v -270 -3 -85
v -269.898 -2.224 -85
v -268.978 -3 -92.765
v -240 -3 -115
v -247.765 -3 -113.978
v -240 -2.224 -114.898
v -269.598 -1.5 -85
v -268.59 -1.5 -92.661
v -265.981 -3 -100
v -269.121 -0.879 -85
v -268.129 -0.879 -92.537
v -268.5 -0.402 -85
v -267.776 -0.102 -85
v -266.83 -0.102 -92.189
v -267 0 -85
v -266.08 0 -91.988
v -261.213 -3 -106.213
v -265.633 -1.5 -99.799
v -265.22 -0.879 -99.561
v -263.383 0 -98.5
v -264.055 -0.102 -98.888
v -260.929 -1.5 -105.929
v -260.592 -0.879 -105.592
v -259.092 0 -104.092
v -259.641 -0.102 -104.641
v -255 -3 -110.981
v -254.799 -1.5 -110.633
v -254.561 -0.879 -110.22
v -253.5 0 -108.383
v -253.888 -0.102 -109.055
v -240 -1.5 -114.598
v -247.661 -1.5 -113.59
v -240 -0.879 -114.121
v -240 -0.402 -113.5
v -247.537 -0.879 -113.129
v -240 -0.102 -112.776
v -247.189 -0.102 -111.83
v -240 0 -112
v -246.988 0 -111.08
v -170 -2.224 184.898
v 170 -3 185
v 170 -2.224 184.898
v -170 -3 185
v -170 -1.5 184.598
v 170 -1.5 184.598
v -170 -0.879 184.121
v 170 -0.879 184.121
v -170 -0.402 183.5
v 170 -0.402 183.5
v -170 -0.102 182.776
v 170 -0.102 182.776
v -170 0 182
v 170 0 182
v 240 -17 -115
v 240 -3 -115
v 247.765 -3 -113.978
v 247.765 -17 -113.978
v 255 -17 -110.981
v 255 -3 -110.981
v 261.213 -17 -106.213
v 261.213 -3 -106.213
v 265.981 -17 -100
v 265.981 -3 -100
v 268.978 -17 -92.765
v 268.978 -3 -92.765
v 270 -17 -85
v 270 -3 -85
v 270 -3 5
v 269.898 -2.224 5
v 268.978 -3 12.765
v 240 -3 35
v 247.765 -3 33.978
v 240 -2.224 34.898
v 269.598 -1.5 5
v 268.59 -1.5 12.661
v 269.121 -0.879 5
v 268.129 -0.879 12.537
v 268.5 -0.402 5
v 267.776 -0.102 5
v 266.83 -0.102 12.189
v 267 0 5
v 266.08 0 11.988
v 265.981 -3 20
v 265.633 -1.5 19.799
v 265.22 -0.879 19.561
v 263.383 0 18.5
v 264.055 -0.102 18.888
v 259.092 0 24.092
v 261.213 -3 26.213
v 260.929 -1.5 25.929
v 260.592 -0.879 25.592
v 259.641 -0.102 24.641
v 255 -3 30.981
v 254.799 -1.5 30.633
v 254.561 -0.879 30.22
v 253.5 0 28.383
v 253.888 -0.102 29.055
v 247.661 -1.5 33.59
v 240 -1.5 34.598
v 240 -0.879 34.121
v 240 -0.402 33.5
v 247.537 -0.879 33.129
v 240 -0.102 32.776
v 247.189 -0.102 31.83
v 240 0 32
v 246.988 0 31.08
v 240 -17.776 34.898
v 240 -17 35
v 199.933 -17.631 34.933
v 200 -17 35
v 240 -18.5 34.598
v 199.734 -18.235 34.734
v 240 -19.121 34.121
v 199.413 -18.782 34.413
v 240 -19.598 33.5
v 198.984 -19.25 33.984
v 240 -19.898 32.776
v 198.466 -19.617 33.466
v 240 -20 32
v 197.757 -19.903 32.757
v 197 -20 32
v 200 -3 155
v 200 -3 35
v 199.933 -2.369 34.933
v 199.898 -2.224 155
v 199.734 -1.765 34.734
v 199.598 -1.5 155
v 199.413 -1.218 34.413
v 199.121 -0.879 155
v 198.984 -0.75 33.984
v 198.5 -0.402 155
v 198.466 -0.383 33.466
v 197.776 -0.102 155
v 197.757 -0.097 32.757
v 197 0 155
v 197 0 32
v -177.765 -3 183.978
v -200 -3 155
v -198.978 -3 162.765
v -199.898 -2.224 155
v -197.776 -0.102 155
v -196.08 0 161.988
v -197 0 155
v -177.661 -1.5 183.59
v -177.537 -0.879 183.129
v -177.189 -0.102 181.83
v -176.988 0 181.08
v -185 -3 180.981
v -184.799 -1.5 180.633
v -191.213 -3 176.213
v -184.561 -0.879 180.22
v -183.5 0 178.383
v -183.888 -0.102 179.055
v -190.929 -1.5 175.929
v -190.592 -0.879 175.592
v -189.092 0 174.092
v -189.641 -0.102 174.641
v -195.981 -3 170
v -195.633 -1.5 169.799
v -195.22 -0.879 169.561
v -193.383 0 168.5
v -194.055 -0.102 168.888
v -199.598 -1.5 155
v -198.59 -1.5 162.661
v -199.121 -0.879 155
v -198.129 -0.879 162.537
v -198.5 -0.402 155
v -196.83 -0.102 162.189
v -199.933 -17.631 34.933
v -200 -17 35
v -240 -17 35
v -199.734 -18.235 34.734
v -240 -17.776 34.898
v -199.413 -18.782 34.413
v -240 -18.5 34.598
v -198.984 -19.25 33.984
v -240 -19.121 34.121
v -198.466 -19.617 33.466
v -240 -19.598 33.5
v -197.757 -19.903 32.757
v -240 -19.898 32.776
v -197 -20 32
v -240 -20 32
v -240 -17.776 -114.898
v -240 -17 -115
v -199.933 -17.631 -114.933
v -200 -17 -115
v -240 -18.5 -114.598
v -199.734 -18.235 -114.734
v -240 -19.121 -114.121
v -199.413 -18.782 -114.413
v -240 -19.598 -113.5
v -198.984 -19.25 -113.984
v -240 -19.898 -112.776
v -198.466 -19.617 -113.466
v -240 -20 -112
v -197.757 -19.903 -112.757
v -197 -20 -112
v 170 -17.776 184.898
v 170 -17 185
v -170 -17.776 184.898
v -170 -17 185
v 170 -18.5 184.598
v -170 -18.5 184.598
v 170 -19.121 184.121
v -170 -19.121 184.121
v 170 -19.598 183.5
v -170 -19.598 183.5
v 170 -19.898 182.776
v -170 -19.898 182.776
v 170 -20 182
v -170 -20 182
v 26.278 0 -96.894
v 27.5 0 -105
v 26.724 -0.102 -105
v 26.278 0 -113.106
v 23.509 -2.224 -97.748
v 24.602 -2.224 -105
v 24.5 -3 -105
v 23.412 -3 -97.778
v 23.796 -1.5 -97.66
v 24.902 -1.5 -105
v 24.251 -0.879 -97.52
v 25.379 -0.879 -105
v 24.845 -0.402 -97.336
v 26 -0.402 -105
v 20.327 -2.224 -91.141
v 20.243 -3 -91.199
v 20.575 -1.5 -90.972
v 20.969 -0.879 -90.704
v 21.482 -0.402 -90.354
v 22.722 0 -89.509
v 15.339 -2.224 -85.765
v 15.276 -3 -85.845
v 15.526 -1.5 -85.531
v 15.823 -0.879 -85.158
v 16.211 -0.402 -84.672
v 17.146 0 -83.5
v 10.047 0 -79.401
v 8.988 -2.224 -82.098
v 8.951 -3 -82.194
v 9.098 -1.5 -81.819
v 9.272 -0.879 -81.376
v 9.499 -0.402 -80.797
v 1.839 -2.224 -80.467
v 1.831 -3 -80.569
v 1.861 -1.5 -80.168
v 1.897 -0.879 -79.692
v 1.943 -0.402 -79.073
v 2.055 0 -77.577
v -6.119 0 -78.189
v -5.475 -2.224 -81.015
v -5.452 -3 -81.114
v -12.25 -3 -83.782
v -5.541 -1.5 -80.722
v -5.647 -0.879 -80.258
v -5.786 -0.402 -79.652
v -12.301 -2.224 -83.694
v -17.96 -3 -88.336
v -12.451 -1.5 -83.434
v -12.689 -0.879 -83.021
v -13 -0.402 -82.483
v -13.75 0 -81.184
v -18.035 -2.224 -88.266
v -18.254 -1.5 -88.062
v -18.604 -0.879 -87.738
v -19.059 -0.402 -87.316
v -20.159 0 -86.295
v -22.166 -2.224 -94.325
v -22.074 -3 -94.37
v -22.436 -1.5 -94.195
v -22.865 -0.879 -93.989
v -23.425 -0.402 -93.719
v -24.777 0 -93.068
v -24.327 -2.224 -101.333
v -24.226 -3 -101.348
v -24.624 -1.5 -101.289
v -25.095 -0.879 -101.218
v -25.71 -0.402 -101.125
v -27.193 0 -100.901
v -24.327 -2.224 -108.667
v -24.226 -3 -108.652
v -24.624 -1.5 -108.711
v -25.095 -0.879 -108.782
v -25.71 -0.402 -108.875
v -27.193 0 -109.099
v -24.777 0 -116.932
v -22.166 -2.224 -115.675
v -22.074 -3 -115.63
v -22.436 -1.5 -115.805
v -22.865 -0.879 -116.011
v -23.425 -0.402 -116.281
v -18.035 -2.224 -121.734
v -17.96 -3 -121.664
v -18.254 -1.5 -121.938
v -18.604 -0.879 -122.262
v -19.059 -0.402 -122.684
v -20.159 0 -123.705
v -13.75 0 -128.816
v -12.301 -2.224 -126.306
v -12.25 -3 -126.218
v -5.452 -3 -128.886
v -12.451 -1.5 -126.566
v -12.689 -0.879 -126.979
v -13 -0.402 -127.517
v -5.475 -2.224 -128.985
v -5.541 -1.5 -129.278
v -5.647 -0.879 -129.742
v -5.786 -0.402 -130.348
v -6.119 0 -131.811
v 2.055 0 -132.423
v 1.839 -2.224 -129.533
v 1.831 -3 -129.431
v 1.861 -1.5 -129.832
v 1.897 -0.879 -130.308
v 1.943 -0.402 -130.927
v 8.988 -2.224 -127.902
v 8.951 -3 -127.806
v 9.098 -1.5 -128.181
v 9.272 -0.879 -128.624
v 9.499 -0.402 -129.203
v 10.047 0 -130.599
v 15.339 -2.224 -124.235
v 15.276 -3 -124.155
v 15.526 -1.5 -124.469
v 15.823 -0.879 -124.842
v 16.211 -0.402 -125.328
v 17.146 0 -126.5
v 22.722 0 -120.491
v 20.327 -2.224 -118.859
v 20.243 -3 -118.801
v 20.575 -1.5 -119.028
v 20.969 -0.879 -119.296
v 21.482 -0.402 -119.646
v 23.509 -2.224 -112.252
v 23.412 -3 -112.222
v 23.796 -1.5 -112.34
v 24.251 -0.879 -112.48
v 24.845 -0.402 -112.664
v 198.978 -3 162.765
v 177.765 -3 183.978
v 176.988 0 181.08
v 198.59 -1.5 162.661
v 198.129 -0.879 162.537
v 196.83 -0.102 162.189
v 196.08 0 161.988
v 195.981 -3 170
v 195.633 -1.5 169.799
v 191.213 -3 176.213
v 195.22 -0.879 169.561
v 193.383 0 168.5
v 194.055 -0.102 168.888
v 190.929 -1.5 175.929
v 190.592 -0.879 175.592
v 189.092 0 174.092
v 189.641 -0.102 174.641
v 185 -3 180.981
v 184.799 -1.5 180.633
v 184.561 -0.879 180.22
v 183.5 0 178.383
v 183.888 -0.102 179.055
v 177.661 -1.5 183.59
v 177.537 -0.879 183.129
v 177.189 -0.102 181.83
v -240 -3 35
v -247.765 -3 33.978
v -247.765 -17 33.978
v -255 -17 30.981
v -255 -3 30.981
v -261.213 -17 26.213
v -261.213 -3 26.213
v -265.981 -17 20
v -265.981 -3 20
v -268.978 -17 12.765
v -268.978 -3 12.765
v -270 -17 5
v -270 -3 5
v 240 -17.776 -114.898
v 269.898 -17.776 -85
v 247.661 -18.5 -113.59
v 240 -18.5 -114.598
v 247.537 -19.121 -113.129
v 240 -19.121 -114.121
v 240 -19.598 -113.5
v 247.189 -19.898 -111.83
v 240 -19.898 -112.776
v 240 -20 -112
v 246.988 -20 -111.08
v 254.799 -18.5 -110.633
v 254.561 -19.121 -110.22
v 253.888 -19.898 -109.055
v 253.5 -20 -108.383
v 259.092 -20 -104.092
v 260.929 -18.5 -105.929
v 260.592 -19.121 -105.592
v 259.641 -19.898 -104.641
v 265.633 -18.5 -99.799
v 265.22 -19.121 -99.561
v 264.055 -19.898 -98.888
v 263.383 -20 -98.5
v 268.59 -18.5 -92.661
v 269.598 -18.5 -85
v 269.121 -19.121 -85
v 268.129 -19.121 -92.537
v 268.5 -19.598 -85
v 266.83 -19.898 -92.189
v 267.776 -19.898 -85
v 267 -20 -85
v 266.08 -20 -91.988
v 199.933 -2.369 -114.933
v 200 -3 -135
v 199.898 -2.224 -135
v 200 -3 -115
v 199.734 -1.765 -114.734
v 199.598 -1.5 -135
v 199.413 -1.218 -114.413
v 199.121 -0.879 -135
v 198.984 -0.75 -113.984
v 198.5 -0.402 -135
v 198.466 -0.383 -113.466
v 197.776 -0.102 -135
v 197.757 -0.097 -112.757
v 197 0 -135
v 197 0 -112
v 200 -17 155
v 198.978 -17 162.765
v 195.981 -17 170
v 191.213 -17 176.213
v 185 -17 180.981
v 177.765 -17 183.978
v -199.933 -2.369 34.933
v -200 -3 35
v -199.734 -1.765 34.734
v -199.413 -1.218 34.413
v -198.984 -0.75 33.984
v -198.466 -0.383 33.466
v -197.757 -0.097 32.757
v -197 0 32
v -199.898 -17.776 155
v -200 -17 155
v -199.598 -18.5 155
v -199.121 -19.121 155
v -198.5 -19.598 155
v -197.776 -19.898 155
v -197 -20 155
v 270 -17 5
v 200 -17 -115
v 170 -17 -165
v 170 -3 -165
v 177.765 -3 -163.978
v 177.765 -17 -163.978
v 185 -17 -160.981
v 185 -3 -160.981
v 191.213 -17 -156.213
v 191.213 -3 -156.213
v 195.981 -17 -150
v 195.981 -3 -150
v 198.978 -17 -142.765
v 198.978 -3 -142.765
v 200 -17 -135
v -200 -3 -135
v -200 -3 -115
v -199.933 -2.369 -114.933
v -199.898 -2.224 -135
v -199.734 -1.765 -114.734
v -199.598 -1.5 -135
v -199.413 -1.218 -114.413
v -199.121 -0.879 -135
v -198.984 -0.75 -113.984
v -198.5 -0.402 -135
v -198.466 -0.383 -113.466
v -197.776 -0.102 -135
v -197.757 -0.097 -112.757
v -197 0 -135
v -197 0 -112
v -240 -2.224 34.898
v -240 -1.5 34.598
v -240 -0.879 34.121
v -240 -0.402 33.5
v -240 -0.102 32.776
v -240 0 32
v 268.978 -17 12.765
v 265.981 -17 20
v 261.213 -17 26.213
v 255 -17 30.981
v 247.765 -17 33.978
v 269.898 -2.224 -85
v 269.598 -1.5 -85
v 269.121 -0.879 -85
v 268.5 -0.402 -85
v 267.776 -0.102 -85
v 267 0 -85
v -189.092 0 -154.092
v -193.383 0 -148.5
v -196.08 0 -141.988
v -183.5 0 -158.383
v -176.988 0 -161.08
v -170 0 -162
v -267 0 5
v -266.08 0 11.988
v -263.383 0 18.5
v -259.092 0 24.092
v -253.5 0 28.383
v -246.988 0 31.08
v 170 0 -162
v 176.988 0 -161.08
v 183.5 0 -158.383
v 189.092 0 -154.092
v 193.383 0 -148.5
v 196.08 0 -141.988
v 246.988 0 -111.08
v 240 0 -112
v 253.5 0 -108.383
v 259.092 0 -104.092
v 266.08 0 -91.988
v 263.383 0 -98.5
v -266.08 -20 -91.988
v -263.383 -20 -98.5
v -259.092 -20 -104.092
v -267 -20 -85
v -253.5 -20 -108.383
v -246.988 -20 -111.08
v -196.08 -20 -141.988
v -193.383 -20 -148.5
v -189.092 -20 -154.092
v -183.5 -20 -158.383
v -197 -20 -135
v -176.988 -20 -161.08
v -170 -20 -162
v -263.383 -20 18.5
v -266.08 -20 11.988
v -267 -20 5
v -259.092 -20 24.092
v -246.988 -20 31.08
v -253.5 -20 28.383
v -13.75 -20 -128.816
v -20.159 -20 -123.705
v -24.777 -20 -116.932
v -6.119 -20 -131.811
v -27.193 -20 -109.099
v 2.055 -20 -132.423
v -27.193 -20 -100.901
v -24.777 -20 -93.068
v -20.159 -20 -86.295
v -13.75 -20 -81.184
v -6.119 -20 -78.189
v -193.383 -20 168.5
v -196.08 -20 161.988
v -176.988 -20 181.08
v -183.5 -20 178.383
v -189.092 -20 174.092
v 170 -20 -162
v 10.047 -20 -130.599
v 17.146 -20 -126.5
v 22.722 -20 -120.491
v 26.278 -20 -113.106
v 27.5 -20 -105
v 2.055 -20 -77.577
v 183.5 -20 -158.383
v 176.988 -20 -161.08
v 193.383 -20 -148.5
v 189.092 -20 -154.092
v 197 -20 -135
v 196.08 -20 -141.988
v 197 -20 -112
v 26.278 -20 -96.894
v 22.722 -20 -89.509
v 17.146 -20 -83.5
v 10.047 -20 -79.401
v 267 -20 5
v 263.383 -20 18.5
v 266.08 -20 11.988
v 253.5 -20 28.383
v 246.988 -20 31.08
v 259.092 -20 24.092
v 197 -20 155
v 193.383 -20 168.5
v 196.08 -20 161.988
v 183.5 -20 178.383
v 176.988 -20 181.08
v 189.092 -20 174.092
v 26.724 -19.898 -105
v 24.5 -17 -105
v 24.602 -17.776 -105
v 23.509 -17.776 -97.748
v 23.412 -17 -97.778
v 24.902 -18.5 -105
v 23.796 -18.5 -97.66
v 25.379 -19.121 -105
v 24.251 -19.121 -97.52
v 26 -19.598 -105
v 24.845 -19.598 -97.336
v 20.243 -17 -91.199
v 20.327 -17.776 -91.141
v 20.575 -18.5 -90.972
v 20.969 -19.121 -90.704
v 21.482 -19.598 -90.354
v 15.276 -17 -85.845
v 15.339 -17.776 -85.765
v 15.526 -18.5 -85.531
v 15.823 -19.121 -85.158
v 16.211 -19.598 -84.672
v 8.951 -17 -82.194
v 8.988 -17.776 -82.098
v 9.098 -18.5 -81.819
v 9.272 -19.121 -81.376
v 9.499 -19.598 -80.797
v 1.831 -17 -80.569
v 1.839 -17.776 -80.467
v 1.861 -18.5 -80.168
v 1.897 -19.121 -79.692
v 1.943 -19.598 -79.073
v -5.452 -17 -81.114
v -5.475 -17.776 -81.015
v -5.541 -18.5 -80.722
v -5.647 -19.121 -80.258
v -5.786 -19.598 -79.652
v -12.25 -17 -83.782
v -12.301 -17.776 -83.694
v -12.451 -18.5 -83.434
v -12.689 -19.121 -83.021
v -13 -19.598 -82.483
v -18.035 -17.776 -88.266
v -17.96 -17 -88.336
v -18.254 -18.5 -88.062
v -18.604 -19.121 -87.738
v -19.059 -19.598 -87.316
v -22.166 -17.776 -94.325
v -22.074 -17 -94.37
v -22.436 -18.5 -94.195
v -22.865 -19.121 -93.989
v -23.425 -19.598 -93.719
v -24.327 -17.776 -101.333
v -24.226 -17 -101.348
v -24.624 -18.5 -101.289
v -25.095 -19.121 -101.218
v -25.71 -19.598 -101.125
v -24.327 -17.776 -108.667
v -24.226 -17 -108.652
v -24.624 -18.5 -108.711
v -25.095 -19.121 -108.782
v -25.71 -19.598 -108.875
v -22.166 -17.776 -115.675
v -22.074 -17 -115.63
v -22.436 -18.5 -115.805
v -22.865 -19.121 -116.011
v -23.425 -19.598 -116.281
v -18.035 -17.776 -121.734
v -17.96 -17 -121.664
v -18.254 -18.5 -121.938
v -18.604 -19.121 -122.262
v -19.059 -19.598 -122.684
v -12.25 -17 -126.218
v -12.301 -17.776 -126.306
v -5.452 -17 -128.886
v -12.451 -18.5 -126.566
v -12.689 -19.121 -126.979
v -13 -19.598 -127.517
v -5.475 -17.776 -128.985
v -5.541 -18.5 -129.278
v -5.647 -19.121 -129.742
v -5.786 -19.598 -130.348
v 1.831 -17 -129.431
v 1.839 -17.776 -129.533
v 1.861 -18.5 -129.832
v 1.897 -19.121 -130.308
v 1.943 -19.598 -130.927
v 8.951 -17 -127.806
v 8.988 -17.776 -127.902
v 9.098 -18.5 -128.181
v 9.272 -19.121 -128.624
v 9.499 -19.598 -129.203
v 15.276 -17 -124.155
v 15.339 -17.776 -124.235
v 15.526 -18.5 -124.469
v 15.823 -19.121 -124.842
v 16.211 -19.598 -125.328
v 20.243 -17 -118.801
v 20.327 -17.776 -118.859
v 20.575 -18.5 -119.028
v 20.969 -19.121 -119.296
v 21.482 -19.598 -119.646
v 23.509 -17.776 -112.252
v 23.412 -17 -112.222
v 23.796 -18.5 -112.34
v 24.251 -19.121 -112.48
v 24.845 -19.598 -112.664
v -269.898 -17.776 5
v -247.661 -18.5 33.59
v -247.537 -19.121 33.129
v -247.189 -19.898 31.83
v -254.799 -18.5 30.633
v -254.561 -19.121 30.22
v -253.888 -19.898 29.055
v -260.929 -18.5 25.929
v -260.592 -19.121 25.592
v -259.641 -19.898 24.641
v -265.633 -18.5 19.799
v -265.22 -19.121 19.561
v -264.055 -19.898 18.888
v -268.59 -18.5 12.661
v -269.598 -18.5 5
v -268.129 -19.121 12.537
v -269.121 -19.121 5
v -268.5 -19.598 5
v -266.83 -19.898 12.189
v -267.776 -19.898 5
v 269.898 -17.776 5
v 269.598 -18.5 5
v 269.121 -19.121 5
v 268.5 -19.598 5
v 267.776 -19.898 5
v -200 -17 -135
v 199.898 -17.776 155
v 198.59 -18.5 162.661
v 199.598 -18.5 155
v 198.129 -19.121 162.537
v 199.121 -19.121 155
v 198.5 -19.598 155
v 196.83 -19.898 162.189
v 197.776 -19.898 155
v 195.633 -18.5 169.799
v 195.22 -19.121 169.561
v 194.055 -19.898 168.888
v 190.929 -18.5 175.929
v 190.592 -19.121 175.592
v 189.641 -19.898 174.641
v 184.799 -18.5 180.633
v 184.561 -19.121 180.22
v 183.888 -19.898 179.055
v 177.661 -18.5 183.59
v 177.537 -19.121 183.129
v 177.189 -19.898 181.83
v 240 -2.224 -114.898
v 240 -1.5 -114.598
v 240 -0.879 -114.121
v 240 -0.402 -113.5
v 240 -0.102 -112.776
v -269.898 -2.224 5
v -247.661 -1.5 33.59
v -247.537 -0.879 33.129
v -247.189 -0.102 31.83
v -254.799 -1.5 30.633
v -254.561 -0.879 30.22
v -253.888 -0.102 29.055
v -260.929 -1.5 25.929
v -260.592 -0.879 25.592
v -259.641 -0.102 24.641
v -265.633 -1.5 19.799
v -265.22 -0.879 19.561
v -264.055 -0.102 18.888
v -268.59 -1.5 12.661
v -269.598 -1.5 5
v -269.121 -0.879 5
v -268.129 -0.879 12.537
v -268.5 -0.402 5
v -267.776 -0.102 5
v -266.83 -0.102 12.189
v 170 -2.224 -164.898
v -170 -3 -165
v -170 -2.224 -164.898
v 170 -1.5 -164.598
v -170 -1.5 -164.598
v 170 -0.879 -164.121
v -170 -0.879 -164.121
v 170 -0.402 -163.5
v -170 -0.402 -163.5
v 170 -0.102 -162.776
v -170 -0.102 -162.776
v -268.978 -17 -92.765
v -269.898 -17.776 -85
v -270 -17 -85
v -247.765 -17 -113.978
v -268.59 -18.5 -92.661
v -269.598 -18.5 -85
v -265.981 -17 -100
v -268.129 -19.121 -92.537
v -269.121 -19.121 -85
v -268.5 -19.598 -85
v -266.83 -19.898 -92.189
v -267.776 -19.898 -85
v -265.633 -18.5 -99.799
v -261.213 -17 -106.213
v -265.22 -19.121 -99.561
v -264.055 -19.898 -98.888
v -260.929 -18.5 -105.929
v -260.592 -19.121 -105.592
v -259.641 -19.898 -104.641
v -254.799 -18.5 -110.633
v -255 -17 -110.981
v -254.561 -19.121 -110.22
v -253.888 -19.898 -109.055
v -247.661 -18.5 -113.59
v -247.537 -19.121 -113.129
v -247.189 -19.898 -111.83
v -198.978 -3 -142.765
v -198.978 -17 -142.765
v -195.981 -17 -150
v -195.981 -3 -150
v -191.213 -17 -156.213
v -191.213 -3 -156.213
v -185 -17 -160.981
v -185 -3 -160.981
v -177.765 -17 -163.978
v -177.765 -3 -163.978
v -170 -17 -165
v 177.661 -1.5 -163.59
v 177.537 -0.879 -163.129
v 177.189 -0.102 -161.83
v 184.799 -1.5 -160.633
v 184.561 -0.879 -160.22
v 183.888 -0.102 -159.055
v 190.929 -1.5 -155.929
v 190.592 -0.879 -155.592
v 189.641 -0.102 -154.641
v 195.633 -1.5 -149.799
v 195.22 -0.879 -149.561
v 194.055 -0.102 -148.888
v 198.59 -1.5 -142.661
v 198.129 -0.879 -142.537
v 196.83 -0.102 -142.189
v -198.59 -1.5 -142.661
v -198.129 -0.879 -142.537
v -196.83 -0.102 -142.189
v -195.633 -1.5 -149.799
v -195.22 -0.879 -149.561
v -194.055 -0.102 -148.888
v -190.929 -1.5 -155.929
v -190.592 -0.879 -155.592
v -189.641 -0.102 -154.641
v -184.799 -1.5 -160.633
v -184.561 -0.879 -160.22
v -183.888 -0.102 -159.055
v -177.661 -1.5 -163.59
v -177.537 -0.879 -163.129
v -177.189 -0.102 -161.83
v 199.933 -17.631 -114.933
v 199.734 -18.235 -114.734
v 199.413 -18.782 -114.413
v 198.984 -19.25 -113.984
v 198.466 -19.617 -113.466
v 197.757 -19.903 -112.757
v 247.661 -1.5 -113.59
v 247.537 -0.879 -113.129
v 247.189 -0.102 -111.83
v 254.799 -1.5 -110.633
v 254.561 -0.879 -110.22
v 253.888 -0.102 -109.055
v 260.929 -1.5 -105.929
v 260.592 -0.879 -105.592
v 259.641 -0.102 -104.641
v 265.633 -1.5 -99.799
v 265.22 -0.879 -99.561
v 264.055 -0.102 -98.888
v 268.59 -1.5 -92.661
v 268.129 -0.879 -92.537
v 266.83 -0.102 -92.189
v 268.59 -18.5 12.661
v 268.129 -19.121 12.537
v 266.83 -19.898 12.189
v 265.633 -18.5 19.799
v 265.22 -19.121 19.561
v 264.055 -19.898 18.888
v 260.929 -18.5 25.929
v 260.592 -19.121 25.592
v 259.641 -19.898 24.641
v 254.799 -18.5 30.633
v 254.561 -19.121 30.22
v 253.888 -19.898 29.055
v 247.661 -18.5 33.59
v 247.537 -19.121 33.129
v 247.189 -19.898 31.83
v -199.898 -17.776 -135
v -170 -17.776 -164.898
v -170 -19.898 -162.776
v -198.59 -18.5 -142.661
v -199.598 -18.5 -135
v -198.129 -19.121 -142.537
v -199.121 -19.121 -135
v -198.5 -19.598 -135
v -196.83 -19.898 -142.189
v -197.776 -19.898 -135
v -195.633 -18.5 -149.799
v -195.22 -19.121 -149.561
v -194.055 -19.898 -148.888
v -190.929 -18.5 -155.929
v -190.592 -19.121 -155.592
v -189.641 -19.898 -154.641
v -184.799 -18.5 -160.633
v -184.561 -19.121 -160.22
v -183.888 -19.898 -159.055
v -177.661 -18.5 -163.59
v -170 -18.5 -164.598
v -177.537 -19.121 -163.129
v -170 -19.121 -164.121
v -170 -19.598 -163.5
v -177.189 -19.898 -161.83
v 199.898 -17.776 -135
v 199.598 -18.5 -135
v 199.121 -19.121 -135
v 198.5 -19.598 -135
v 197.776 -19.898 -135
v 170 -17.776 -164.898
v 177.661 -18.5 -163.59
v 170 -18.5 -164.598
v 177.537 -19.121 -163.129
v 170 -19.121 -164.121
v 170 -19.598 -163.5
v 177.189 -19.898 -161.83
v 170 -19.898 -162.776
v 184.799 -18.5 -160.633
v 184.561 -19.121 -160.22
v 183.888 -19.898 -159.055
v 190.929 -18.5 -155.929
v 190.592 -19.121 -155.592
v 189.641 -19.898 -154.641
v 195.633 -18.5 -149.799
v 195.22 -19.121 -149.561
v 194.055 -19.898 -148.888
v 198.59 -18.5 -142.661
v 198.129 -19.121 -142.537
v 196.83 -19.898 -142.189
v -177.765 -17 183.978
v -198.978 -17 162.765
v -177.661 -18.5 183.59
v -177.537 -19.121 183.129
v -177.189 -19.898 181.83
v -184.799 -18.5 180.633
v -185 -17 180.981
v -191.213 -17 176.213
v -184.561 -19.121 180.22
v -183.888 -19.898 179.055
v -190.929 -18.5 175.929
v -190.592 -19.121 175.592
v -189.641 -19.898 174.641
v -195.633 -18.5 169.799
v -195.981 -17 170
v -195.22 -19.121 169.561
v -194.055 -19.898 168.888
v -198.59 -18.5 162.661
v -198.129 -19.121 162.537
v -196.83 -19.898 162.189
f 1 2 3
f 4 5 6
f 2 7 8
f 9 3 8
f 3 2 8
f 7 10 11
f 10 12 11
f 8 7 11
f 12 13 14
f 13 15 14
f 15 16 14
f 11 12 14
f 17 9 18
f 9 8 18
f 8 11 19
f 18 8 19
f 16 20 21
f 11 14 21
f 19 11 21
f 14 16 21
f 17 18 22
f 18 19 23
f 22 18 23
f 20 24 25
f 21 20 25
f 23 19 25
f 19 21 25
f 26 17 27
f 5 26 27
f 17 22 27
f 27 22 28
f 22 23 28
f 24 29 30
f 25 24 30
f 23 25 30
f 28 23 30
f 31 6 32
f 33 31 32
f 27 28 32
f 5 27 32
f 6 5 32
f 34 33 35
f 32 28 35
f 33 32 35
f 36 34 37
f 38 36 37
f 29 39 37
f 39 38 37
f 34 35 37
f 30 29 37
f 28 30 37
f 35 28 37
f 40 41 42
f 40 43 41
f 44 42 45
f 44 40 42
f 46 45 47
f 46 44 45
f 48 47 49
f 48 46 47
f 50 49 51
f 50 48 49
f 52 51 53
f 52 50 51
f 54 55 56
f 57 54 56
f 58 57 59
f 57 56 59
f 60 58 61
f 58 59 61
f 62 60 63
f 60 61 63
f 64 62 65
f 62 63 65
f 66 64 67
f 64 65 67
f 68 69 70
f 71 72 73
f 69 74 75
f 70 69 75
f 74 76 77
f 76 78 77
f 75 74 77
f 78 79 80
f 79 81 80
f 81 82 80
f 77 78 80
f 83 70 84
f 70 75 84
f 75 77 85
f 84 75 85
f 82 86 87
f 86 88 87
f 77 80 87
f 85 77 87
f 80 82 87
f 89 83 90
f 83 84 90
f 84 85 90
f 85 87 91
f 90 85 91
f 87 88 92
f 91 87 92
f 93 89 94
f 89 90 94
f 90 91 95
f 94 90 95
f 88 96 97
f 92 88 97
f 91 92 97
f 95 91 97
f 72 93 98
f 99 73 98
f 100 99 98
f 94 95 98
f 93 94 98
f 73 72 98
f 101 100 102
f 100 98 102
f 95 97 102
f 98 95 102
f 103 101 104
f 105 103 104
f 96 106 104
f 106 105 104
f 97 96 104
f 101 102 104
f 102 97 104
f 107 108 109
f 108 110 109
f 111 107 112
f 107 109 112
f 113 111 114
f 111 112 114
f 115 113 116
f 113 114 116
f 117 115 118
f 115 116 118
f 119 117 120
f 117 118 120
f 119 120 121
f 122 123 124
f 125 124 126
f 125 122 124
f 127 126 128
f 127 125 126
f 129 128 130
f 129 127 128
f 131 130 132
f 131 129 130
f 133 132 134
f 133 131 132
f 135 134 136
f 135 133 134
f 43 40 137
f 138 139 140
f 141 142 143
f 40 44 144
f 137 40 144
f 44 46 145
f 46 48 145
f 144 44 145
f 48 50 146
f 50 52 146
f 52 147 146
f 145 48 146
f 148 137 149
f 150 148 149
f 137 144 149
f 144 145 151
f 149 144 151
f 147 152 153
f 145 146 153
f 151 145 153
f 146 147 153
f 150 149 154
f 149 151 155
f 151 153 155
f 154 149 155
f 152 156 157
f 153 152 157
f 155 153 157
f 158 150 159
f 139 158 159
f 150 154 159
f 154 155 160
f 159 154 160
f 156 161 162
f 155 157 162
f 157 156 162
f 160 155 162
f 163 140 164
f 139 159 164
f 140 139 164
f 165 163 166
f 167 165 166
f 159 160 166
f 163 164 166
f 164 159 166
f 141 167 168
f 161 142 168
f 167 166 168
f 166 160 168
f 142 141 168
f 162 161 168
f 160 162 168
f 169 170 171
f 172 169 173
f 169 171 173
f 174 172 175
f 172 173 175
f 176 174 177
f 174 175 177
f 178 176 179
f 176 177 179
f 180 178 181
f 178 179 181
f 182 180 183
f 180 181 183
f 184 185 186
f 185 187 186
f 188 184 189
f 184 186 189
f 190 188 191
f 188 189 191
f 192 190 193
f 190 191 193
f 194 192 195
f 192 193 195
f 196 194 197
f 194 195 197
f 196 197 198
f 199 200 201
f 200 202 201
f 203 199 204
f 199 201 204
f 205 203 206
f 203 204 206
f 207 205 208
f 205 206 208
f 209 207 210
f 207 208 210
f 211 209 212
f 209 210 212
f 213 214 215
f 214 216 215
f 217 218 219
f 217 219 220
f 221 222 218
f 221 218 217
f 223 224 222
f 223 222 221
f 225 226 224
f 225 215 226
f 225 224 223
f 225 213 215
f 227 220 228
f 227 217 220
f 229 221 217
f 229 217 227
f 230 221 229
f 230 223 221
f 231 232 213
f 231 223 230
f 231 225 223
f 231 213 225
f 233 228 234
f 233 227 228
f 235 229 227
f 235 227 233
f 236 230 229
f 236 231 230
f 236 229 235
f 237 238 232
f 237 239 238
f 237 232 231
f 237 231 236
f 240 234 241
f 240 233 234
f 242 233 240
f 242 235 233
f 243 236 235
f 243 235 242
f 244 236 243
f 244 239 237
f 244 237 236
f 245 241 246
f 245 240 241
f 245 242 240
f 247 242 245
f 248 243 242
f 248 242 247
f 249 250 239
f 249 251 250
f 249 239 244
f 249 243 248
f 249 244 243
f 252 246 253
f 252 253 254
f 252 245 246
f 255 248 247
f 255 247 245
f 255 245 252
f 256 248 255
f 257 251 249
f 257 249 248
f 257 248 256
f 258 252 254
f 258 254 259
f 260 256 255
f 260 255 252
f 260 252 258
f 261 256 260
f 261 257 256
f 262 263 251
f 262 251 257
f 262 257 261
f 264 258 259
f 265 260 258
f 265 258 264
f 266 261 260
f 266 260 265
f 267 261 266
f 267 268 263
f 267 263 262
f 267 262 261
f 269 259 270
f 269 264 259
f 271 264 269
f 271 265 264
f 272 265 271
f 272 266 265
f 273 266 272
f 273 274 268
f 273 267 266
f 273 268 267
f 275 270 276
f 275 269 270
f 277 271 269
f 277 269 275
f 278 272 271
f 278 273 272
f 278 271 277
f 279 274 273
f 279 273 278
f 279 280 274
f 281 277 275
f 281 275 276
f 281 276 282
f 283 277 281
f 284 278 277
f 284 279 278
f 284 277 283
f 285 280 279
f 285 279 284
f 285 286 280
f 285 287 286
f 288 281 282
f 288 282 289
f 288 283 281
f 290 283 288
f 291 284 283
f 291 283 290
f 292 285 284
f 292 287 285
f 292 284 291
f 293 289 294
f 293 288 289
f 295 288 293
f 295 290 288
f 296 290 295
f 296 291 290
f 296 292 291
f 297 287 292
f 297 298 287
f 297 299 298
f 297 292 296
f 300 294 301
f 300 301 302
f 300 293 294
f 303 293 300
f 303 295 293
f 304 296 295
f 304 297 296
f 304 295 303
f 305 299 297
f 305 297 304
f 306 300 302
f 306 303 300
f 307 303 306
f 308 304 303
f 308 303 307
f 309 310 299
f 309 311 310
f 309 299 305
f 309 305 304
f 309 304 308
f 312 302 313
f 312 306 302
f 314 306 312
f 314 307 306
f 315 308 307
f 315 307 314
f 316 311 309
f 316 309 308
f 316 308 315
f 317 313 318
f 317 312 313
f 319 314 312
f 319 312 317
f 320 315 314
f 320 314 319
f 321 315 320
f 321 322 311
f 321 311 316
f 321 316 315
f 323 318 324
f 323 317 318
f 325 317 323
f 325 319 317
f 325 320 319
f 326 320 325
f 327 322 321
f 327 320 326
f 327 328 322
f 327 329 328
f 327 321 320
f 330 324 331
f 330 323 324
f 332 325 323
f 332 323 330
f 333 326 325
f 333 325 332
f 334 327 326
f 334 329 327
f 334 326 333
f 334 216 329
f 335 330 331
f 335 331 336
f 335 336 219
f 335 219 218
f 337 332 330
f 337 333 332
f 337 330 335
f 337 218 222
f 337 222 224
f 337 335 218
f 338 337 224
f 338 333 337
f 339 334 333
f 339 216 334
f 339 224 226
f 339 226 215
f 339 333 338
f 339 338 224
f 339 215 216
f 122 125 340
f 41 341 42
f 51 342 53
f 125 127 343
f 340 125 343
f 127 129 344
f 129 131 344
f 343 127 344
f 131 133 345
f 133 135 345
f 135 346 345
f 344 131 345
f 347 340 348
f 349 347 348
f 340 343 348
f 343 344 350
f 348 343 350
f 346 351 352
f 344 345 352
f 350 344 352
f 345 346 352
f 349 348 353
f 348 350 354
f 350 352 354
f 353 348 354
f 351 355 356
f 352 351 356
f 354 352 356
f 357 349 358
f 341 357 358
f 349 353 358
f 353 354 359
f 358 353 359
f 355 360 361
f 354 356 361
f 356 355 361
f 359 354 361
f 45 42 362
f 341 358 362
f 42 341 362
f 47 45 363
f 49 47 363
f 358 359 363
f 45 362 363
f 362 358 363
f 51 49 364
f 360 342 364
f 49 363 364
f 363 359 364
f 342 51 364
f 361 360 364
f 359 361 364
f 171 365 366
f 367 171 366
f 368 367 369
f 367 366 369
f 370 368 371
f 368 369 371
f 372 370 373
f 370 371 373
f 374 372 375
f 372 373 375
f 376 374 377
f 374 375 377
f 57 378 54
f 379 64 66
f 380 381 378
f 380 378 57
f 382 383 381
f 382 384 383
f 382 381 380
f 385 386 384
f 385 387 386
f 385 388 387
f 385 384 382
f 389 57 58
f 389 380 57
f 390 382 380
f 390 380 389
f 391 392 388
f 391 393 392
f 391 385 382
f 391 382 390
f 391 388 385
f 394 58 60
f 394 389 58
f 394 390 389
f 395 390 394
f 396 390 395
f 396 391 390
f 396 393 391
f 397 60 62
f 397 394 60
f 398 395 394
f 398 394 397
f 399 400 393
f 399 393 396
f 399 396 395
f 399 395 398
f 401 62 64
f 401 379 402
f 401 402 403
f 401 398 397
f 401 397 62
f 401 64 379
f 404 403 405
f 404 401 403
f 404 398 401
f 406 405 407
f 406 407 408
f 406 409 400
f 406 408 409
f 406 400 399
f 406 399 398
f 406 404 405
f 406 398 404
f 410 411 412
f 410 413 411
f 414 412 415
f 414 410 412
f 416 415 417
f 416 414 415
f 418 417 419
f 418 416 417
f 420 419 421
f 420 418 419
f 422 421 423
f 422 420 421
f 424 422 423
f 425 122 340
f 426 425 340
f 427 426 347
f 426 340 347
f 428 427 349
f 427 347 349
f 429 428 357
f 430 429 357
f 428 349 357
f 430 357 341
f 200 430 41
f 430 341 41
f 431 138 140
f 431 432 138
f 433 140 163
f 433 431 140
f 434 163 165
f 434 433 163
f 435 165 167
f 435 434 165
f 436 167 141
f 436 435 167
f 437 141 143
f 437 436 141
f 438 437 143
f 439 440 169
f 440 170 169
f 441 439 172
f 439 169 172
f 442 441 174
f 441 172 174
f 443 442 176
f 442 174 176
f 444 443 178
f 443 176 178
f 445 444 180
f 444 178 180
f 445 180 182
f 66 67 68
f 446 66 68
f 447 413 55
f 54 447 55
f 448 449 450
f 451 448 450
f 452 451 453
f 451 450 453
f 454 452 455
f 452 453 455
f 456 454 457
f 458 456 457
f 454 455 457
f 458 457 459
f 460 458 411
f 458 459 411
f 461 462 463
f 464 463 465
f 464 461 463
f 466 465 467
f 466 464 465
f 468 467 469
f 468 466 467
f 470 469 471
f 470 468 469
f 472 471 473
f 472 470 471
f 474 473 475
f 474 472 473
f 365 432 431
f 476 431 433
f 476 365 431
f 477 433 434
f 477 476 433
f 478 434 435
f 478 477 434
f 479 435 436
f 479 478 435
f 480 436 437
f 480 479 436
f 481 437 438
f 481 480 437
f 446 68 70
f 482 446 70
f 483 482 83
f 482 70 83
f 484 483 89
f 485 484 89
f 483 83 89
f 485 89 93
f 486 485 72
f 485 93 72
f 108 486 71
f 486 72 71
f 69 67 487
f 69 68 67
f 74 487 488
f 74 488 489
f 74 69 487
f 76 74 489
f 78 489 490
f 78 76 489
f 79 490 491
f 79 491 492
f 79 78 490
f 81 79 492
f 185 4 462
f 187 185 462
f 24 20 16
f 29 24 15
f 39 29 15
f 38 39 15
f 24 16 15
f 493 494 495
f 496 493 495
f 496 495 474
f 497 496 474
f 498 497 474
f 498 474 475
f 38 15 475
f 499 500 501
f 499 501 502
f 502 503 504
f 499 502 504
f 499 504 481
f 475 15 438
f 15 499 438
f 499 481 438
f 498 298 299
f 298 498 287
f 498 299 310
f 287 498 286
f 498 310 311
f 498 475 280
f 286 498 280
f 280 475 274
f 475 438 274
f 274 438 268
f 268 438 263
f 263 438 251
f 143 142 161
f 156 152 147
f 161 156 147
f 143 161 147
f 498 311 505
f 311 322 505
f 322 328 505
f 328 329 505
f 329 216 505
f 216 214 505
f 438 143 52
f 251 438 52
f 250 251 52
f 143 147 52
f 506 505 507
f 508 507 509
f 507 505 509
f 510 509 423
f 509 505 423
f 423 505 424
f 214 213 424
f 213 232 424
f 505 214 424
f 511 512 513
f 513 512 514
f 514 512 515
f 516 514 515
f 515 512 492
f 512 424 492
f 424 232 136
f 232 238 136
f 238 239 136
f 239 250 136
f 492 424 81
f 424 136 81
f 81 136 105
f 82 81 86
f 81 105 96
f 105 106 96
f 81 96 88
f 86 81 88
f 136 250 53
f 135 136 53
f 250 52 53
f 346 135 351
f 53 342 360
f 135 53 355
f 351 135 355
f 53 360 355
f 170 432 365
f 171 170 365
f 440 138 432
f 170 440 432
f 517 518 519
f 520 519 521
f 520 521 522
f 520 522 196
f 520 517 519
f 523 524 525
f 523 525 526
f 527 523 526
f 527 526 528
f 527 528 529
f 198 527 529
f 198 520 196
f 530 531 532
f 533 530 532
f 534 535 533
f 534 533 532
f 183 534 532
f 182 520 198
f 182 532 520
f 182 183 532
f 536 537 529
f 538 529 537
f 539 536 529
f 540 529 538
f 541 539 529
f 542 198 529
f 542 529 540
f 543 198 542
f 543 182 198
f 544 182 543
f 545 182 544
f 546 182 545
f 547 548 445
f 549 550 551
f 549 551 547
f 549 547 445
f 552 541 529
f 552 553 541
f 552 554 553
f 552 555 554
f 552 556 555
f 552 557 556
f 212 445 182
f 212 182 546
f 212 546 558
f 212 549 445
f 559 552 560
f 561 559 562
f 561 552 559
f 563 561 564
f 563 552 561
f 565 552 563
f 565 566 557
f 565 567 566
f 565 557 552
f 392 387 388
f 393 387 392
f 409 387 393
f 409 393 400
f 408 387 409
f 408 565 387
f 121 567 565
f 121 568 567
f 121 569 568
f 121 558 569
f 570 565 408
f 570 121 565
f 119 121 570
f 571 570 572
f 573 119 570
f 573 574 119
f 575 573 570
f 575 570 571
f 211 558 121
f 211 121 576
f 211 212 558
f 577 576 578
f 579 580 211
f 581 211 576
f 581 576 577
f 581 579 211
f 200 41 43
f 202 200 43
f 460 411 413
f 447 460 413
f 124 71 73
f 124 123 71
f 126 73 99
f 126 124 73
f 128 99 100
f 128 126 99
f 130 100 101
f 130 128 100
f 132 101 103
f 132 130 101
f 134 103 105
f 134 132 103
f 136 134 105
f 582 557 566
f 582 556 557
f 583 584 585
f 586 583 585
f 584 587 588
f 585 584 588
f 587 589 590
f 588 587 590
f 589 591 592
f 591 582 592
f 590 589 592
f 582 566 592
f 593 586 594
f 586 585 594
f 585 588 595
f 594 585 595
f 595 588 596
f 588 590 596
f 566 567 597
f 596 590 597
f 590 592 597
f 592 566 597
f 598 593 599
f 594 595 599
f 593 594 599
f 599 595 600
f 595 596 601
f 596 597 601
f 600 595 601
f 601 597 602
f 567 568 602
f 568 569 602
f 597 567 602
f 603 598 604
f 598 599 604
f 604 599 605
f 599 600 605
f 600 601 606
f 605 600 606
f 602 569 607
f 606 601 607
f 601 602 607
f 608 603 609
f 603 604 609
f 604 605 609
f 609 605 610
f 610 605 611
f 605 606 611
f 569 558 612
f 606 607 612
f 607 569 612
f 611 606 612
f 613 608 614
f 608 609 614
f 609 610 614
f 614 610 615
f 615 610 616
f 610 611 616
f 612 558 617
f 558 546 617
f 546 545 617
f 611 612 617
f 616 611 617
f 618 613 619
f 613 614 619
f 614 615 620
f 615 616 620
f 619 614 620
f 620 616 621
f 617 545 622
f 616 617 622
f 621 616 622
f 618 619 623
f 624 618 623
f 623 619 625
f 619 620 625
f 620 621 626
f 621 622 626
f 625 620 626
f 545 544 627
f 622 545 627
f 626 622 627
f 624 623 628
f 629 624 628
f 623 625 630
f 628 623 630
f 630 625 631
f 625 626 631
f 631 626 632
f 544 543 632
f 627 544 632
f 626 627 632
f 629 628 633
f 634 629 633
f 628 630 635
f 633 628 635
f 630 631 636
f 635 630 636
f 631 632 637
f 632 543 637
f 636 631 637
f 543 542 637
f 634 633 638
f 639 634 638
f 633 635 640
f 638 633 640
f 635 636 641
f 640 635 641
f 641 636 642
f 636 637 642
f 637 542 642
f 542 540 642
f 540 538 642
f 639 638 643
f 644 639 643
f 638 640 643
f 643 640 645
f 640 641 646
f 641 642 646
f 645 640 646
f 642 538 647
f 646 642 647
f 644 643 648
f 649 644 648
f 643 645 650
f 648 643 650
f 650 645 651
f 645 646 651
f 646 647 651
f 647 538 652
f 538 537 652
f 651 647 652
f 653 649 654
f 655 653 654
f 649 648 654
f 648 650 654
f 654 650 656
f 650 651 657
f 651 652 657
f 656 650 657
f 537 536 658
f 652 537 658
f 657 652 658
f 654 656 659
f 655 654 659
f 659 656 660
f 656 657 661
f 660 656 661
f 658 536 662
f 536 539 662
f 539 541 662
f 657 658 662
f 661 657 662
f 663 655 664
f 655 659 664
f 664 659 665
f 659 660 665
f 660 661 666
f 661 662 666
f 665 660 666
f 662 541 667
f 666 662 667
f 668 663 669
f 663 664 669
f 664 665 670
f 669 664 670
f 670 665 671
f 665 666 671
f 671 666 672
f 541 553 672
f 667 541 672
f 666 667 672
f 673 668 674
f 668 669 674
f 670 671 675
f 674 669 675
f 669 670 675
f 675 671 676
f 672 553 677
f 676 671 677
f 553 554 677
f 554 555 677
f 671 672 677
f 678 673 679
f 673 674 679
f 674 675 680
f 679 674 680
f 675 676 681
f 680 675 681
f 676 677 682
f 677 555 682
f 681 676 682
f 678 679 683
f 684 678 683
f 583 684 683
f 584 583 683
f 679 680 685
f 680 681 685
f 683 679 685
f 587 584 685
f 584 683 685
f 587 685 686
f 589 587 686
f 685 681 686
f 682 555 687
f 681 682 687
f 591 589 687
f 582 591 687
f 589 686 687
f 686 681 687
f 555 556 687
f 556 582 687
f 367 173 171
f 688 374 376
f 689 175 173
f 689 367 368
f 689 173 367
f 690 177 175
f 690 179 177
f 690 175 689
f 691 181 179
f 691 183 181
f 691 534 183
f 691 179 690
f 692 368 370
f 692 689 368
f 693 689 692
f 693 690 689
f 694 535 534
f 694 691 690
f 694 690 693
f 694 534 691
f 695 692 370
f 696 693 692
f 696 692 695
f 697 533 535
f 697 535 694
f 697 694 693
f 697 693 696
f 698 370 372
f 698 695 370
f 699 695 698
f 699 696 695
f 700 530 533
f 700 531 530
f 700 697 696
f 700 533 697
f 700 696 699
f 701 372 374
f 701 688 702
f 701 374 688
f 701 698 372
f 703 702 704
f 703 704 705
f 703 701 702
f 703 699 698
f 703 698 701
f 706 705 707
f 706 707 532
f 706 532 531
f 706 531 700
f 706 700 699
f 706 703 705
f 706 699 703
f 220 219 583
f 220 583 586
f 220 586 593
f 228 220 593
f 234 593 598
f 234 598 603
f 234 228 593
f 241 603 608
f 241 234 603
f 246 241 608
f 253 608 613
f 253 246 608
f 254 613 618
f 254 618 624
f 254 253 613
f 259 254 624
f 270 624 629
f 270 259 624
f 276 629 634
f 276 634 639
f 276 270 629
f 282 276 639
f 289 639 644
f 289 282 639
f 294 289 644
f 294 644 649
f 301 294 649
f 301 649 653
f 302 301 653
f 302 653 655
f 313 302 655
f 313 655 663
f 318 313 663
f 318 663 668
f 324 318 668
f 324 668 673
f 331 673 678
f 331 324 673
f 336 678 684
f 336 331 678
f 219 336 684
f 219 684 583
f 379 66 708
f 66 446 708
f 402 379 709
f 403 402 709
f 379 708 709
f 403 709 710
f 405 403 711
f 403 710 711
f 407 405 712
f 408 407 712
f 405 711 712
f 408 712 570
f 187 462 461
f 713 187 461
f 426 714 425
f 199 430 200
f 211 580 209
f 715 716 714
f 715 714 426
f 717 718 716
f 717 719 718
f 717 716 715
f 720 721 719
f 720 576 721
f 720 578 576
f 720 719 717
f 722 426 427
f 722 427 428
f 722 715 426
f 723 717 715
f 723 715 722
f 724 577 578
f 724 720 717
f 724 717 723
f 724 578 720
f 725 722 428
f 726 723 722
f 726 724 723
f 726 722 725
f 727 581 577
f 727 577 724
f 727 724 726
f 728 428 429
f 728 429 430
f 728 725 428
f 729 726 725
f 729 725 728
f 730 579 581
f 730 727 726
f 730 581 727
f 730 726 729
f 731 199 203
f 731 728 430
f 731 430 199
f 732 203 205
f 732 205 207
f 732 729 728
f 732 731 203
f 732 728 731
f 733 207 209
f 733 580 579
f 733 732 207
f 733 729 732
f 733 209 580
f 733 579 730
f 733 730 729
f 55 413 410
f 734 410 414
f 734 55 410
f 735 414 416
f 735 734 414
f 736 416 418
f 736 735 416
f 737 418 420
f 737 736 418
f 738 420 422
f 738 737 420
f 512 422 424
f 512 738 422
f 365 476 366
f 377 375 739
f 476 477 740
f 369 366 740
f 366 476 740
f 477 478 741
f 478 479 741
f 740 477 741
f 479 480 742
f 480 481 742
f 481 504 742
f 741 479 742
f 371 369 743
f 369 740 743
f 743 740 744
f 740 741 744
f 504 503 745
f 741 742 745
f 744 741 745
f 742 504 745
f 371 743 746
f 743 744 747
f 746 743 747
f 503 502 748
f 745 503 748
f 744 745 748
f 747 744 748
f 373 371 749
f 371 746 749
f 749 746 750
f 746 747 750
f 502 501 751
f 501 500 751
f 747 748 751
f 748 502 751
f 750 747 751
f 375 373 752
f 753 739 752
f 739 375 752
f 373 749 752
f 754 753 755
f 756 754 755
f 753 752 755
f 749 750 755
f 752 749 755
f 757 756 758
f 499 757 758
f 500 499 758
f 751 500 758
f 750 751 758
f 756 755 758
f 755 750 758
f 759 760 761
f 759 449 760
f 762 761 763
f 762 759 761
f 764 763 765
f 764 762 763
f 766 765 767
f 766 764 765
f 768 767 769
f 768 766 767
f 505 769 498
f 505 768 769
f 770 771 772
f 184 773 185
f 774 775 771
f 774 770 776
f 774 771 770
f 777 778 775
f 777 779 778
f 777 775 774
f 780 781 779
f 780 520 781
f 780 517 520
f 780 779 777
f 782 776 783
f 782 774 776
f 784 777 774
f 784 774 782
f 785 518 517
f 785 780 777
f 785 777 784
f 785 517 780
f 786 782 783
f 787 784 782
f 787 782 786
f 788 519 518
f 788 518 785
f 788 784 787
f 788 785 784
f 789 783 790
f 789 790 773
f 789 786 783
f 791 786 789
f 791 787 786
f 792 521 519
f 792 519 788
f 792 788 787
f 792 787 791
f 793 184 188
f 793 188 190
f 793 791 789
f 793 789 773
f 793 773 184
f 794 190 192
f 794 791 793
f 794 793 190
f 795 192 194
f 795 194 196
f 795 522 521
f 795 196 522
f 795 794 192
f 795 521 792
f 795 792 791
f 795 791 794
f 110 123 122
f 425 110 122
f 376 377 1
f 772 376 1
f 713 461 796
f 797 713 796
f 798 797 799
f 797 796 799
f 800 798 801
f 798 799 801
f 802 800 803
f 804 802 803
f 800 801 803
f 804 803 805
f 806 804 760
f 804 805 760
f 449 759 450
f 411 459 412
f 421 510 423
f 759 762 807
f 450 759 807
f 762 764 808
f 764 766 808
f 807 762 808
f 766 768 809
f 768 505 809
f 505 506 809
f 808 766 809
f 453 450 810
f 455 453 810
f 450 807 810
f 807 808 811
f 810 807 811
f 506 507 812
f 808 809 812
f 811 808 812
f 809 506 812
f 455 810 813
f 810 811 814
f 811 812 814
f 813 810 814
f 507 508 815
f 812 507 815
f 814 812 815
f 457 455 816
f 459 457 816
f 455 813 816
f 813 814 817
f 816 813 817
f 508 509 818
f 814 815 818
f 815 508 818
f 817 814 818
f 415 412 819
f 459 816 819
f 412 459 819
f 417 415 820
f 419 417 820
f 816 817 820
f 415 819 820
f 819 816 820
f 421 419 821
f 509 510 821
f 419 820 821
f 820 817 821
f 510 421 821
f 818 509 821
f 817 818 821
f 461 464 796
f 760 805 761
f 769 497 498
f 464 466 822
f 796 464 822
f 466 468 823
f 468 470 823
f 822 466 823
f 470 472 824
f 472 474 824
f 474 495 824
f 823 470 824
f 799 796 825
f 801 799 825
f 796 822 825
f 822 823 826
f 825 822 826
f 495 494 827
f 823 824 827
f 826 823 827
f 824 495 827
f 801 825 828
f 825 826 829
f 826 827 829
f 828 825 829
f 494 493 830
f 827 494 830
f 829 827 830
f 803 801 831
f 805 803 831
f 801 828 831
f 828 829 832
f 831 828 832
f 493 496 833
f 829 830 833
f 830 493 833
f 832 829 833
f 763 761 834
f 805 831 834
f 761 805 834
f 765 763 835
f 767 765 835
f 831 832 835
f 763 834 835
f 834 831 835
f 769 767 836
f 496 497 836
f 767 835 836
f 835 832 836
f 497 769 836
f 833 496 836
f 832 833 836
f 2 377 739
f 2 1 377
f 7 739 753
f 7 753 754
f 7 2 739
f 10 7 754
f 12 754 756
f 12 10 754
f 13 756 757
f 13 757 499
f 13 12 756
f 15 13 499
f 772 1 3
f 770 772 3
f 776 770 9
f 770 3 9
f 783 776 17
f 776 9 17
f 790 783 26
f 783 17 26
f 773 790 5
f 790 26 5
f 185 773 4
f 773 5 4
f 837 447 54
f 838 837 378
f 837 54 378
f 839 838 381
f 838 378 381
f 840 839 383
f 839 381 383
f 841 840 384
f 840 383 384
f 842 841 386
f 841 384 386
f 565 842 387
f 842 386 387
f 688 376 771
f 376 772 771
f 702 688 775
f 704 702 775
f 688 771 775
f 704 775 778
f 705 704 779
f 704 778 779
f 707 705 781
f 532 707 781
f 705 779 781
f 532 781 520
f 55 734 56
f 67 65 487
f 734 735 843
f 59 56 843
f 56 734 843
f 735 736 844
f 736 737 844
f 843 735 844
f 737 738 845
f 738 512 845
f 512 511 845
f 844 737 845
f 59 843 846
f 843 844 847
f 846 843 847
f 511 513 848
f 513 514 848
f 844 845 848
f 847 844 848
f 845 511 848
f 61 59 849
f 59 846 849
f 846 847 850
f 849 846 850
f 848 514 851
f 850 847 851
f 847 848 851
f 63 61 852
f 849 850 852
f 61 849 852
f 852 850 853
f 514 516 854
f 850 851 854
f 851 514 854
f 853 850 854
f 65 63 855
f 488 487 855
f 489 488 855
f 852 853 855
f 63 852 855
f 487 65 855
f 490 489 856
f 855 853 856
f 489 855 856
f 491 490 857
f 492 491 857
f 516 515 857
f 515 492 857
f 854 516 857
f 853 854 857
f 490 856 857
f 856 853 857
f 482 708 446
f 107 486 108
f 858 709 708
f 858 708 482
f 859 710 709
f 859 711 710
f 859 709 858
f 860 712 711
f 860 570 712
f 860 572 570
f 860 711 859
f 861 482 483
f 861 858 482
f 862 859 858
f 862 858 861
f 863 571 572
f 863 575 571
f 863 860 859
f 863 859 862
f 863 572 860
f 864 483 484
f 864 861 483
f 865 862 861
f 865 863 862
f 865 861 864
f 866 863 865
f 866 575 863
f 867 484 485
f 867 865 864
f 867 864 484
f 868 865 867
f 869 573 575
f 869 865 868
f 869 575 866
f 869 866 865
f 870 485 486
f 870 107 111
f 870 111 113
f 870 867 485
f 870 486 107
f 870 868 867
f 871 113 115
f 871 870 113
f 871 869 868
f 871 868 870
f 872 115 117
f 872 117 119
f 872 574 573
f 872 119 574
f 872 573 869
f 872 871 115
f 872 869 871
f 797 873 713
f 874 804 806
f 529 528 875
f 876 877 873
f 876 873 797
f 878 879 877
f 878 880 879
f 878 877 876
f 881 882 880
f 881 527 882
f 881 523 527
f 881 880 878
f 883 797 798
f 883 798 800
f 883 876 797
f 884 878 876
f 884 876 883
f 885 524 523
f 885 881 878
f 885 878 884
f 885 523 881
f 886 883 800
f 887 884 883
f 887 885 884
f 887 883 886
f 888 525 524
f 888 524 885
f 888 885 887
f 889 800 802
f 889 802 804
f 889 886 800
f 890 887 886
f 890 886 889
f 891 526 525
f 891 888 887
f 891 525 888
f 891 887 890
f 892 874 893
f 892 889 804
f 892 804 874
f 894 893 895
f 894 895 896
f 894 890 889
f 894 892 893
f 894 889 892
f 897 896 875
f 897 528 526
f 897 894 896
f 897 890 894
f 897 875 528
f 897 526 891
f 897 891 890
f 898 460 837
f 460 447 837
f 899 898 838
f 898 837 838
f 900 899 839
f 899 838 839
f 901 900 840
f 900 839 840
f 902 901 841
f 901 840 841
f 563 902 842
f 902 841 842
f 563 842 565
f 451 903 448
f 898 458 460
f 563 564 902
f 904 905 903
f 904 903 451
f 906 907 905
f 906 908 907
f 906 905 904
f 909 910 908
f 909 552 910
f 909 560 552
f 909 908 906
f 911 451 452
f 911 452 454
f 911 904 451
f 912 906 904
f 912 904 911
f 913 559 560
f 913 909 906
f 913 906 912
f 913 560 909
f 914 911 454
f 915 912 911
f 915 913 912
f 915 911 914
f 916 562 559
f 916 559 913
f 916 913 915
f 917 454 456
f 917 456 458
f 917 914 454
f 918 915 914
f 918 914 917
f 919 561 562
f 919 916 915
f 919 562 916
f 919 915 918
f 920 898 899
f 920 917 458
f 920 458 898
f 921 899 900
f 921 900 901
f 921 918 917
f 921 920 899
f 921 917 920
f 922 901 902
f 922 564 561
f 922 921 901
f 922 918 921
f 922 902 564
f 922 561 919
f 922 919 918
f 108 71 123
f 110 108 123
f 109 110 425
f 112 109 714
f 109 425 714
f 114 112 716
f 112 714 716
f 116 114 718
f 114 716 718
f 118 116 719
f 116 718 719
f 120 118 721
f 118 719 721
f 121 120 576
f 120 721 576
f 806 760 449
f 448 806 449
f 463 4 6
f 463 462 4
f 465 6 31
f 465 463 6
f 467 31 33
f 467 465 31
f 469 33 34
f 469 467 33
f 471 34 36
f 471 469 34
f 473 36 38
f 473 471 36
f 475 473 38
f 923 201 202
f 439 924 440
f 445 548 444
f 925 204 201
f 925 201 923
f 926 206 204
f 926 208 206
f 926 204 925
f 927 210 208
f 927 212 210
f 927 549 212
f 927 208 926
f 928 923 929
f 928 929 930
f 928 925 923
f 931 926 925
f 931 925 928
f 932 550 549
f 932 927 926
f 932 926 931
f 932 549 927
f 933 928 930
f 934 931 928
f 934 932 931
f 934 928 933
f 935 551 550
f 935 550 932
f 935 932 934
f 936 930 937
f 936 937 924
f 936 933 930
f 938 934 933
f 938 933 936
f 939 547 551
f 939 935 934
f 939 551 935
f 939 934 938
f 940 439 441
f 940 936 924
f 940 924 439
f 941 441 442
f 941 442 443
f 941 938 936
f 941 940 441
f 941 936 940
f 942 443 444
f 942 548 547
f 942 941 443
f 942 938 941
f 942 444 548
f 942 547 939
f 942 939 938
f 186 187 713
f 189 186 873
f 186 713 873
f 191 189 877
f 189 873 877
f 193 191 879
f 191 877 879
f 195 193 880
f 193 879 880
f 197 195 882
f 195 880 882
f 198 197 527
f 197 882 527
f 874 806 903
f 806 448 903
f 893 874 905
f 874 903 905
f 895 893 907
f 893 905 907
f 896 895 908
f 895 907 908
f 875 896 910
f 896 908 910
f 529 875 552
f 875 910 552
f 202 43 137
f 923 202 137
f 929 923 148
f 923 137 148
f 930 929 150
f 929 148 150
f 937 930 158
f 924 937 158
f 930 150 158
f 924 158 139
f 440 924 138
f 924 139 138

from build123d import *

# Parameters (mm, degrees)
F0_R     = 24.5
F1_DEPTH = 20
F2_R     = 3


with BuildPart() as f1:
    # F0 (on Front) → F1 (new body)
    with BuildSketch(Plane.XZ):
        with BuildLine():
            ThreePointArc((170, -165), (191.213203, -156.213203), (200, -135))
            Line((200, -135), (200, -115))
            Line((200, -115), (240, -115))
            ThreePointArc((240, -115), (261.213203, -106.213203), (270, -85))
            Line((270, -85), (270, 5))
            ThreePointArc((270, 5), (261.213203, 26.213203), (240, 35))
            Line((240, 35), (200, 35))
            Line((200, 35), (200, 155))
            ThreePointArc((200, 155), (191.213203, 176.213203), (170, 185))
            Line((170, 185), (0, 185))
            Line((0, 185), (-170, 185))
            ThreePointArc((-170, 185), (-191.213203, 176.213203), (-200, 155))
            Line((-200, 155), (-200, 35))
            Line((-200, 35), (-240, 35))
            ThreePointArc((-240, 35), (-261.213203, 26.213203), (-270, 5))
            Line((-270, 5), (-270, -85))
            ThreePointArc((-270, -85), (-261.213203, -106.213203), (-240, -115))
            Line((-240, -115), (-200, -115))
            Line((-200, -115), (-200, -135))
            ThreePointArc((-200, -135), (-191.213203, -156.213203), (-170, -165))
            Line((-170, -165), (0, -165))
            Line((0, -165), (170, -165))
        make_face()
        with Locations((0, -105)):
            Circle(F0_R, mode=Mode.SUBTRACT)
    extrude(amount=F1_DEPTH)

    # F2
    f2_edges = [f1.edges().sort_by_distance(p)[0] for p in [
        (-261.213203, 0, 26.213203),
        (-270, 0, -40),
        (-261.213203, 0, -106.213203),
        (-220, 0, -115),
        (-200, 0, -125),
        (-191.213203, 0, -156.213203),
        (0, 0, -165),
        (191.213203, 0, -156.213203),
        (200, 0, -125),
        (220, 0, -115),
        (261.213203, 0, -106.213203),
        (270, 0, -40),
        (261.213203, 0, 26.213203),
        (220, 0, 35),
        (200, 0, 95),
        (191.213203, 0, 176.213203),
        (0, 0, 185),
        (-191.213203, 0, 176.213203),
        (-200, 0, 95),
        (-220, 0, 35),
        (-24.5, 0, -105),
        (-261.213203, -20, 26.213203),
        (-270, -20, -40),
        (-261.213203, -20, -106.213203),
        (-220, -20, -115),
        (-200, -20, -125),
        (-191.213203, -20, -156.213203),
        (0, -20, -165),
        (191.213203, -20, -156.213203),
        (200, -20, -125),
        (220, -20, -115),
        (261.213203, -20, -106.213203),
        (270, -20, -40),
        (261.213203, -20, 26.213203),
        (220, -20, 35),
        (200, -20, 95),
        (191.213203, -20, 176.213203),
        (0, -20, 185),
        (-191.213203, -20, 176.213203),
        (-200, -20, 95),
        (-220, -20, 35),
        (-24.5, -20, -105),
    ]]
    fillet(f2_edges, radius=F2_R)


solid = f1.part
